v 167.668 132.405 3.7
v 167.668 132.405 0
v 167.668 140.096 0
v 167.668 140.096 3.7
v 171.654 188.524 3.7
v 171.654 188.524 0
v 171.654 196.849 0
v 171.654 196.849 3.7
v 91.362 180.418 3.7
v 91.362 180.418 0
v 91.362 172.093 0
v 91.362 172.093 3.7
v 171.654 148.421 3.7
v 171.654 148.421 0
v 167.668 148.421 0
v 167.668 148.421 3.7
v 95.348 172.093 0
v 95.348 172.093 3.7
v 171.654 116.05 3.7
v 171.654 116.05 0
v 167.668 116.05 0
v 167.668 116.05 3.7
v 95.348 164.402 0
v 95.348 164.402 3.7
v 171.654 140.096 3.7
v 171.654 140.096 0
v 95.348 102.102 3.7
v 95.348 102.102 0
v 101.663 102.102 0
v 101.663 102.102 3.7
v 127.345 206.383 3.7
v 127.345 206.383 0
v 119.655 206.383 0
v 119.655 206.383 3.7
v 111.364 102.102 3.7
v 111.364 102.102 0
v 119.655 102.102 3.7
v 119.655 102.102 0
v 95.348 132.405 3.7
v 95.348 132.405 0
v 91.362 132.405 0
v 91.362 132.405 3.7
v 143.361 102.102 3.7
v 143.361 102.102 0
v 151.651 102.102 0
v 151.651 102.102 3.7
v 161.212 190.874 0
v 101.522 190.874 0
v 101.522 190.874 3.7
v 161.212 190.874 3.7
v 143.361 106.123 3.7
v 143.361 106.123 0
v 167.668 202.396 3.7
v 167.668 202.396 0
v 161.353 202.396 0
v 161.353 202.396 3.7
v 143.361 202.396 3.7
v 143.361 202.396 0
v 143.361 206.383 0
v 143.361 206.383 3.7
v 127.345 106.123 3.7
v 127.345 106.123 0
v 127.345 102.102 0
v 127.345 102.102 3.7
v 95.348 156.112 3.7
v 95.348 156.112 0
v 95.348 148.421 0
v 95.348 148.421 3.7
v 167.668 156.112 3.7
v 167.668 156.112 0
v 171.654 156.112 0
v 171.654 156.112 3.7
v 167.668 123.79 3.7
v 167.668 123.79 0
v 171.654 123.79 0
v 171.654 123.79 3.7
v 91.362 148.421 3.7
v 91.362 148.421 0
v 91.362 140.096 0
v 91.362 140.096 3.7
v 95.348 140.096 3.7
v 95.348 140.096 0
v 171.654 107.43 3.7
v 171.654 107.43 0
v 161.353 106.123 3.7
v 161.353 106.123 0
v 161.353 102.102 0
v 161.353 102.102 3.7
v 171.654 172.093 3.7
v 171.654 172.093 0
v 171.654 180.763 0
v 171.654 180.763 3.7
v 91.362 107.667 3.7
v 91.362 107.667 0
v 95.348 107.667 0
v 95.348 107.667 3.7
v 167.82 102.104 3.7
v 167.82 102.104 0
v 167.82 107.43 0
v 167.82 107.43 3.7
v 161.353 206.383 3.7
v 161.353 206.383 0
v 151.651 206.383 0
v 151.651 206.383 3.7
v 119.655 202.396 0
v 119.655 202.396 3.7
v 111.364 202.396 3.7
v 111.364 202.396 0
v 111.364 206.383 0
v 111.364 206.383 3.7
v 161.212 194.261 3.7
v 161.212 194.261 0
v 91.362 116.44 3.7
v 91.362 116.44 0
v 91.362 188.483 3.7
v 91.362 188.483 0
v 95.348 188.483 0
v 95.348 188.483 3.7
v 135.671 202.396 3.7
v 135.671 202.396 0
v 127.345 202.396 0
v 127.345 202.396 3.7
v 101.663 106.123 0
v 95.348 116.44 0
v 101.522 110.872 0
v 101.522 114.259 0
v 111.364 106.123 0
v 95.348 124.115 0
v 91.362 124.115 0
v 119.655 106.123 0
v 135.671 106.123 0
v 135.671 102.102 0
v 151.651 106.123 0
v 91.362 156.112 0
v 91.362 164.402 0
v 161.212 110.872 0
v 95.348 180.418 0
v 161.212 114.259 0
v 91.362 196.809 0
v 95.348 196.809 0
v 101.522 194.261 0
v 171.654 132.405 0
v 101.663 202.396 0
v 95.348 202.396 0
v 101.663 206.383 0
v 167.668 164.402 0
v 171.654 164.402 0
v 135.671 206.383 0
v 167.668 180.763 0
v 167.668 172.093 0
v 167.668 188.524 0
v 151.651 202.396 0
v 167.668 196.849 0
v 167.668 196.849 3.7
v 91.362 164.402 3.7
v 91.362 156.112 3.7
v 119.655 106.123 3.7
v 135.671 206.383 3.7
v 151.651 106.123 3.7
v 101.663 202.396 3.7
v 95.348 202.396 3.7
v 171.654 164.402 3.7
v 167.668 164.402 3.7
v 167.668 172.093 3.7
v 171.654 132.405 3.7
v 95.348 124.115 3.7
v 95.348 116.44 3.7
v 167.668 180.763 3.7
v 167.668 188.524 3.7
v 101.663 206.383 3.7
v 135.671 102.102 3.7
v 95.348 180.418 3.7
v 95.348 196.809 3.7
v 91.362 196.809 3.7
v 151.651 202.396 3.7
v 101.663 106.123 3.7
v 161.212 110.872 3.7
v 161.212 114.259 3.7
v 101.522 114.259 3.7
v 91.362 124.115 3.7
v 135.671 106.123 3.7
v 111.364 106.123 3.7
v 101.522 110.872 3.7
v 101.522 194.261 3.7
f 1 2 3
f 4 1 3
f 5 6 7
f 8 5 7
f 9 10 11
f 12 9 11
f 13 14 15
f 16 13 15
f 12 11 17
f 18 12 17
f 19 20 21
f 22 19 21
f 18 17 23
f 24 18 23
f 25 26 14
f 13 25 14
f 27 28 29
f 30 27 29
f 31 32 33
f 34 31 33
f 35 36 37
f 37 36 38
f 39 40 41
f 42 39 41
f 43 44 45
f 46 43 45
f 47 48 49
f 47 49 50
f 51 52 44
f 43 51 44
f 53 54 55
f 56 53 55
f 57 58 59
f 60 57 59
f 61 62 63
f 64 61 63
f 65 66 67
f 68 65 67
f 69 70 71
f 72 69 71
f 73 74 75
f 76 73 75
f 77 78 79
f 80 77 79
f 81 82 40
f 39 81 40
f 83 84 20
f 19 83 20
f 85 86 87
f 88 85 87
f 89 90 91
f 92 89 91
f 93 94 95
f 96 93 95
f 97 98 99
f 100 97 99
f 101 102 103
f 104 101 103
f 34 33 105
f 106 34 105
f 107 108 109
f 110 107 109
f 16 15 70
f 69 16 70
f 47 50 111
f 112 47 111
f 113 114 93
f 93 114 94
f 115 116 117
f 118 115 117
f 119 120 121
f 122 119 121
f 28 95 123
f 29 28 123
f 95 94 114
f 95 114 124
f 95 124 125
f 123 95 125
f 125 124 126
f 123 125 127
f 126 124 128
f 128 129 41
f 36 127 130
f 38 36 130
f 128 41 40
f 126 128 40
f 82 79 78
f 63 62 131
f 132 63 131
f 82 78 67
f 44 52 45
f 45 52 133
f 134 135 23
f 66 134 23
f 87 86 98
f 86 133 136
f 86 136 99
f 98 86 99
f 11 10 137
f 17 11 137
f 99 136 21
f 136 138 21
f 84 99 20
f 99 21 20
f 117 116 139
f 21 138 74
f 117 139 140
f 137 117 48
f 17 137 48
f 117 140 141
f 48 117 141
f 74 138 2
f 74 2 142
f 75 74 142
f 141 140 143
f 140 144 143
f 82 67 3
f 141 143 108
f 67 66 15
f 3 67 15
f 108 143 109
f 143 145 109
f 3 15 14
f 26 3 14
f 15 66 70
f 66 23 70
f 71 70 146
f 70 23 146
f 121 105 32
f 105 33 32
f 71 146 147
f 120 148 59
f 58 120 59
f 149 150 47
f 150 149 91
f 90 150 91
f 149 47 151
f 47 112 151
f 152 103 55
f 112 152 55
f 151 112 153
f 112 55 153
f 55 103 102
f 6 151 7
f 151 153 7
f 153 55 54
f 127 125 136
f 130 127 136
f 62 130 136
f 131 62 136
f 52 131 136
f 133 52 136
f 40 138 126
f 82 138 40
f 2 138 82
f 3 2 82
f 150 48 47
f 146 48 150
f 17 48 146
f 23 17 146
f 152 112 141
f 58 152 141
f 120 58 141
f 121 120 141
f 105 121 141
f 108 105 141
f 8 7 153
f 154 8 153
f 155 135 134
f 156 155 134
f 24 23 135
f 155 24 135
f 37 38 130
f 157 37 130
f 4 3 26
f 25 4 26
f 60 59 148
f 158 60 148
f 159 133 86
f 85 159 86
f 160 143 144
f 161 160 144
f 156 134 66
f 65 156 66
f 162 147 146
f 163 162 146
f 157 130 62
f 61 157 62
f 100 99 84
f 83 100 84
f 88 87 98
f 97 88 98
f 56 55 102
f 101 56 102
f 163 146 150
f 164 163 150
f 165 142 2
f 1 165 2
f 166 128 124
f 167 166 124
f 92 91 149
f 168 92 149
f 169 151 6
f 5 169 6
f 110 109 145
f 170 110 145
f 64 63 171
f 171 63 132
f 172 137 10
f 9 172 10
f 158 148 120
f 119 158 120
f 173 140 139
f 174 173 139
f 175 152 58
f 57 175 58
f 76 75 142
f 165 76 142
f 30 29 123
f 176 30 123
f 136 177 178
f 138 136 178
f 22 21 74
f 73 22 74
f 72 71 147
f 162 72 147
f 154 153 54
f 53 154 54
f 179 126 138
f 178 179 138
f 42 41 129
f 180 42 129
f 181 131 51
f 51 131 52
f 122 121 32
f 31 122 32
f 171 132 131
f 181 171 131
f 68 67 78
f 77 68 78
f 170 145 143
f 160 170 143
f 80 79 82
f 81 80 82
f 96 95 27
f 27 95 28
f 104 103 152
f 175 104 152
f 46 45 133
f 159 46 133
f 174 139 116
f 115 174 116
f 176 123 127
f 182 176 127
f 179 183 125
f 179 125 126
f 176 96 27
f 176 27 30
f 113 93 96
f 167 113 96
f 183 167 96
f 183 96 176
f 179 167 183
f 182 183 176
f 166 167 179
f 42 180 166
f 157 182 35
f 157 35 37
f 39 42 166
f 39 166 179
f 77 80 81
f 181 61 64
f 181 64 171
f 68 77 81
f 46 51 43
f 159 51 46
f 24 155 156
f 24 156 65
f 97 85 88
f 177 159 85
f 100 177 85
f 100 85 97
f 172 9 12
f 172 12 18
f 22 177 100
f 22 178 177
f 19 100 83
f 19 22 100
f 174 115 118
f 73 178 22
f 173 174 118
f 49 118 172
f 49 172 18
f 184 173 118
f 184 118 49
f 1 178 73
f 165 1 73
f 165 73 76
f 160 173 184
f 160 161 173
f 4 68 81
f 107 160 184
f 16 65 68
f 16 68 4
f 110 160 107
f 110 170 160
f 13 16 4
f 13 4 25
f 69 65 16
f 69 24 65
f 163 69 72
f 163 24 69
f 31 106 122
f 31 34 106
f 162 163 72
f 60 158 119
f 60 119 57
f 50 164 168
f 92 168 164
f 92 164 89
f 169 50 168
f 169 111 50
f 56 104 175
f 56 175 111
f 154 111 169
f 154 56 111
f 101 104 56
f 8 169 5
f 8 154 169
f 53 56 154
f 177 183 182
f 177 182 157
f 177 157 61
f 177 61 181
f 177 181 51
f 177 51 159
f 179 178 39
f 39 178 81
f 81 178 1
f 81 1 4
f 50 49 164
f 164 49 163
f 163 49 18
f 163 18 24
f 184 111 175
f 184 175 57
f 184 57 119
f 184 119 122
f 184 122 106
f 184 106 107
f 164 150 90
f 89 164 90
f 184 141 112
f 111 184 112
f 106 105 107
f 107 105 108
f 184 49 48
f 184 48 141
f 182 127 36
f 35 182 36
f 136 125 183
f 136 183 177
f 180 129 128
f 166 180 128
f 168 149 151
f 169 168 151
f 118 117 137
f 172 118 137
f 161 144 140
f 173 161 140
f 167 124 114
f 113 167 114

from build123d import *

# Parameters (mm, degrees)
MODEL_W             = 59.689998908
MODEL_H             = 3.386668819
MODEL_H_2           = 3.386666801
BOSS_EXTRUDE1_DEPTH = 3.7


with BuildPart() as part:
    # Model → Boss-Extrude1 (new body)
    with BuildSketch(Plane.XY):
        Polygon((171.653953395, 180.763341901), (167.667564776, 180.763341901), (167.667564776, 188.523500843), (171.653953393, 188.523500843), (171.653953393, 196.849055858), (167.667564774, 196.849055858), (167.667564774, 202.396336528), (161.352865562, 202.396336528), (161.352865562, 206.382725147), (151.651476676, 206.382725147), (151.651476676, 202.396336528), (143.3611989, 202.396336528), (143.3611989, 206.382725147), (135.670644961, 206.382725147), (135.670644961, 202.396336528), (127.3450886, 202.396336528), (127.3450886, 206.382725147), (119.654533316, 206.382725147), (119.654533316, 202.396336528), (111.36425554, 202.396336528), (111.36425554, 206.382725147), (101.662866654, 206.382725147), (101.662866654, 202.396336528), (95.348117657, 202.396336528), (95.348117657, 196.809013257), (91.361729039, 196.809013257), (91.361729039, 188.483458242), (95.348117657, 188.483458848), (95.348117657, 180.418280574), (91.361733076, 180.418280574), (91.361733076, 172.092725559), (95.348117657, 172.092725559), (95.348117657, 164.402168929), (91.361733076, 164.402168929), (91.361733076, 156.111891153), (95.348117657, 156.111891153), (95.348117657, 148.421337214), (91.361733076, 148.421337214), (91.361733076, 140.095782199), (95.348117657, 140.095782199), (95.348117657, 132.405225569), (91.361733076, 132.405225569), (91.361733076, 124.114947793), (95.348117574, 124.114947793), (95.348117574, 116.440193769), (91.361728955, 116.440193769), (91.361728955, 107.667091645), (95.348117574, 107.667091645), (95.348117658, 102.101616643), (101.662843109, 102.101616643), (101.662843109, 106.123281156), (111.364231995, 106.123281156), (111.364231995, 102.101616643), (119.654509771, 102.101616643), (119.654509771, 106.123281156), (127.34506371, 106.123281156), (127.34506371, 102.101616643), (135.67062007, 102.101616643), (135.67062007, 106.123281156), (143.361175355, 106.123281156), (143.361175355, 102.101616643), (151.651453131, 102.101616643), (151.651453131, 106.123281156), (161.352842017, 106.123281156), (161.352842017, 102.101616643), (167.820439872, 102.103733493), (167.820439872, 107.429661364), (171.653953395, 107.429661364), (171.653953395, 116.049769541), (167.667564776, 116.049769541), (167.667564776, 123.789730804), (171.653953395, 123.789730804), (171.653953395, 132.405225594), (167.667564776, 132.405225594), (167.667564776, 136.4004416), (167.667564776, 140.095782224), (171.653953395, 140.095782224), (171.653953395, 148.421337239), (167.667564776, 148.421337239), (167.667564776, 153.3044818), (167.667564776, 156.111891178), (171.653953395, 156.111891178), (171.653953395, 164.402168953), (167.667564776, 164.402168953), (167.667564776, 172.092725584), (171.653953395, 172.092725584), align=None)
        with Locations((131.366728222, 112.565500146)):
            Rectangle(MODEL_W, MODEL_H, mode=Mode.SUBTRACT)
        with Locations((131.366728222, 192.567447735)):
            Rectangle(MODEL_W, MODEL_H_2, mode=Mode.SUBTRACT)
    extrude(amount=BOSS_EXTRUDE1_DEPTH)


solid = part.part
